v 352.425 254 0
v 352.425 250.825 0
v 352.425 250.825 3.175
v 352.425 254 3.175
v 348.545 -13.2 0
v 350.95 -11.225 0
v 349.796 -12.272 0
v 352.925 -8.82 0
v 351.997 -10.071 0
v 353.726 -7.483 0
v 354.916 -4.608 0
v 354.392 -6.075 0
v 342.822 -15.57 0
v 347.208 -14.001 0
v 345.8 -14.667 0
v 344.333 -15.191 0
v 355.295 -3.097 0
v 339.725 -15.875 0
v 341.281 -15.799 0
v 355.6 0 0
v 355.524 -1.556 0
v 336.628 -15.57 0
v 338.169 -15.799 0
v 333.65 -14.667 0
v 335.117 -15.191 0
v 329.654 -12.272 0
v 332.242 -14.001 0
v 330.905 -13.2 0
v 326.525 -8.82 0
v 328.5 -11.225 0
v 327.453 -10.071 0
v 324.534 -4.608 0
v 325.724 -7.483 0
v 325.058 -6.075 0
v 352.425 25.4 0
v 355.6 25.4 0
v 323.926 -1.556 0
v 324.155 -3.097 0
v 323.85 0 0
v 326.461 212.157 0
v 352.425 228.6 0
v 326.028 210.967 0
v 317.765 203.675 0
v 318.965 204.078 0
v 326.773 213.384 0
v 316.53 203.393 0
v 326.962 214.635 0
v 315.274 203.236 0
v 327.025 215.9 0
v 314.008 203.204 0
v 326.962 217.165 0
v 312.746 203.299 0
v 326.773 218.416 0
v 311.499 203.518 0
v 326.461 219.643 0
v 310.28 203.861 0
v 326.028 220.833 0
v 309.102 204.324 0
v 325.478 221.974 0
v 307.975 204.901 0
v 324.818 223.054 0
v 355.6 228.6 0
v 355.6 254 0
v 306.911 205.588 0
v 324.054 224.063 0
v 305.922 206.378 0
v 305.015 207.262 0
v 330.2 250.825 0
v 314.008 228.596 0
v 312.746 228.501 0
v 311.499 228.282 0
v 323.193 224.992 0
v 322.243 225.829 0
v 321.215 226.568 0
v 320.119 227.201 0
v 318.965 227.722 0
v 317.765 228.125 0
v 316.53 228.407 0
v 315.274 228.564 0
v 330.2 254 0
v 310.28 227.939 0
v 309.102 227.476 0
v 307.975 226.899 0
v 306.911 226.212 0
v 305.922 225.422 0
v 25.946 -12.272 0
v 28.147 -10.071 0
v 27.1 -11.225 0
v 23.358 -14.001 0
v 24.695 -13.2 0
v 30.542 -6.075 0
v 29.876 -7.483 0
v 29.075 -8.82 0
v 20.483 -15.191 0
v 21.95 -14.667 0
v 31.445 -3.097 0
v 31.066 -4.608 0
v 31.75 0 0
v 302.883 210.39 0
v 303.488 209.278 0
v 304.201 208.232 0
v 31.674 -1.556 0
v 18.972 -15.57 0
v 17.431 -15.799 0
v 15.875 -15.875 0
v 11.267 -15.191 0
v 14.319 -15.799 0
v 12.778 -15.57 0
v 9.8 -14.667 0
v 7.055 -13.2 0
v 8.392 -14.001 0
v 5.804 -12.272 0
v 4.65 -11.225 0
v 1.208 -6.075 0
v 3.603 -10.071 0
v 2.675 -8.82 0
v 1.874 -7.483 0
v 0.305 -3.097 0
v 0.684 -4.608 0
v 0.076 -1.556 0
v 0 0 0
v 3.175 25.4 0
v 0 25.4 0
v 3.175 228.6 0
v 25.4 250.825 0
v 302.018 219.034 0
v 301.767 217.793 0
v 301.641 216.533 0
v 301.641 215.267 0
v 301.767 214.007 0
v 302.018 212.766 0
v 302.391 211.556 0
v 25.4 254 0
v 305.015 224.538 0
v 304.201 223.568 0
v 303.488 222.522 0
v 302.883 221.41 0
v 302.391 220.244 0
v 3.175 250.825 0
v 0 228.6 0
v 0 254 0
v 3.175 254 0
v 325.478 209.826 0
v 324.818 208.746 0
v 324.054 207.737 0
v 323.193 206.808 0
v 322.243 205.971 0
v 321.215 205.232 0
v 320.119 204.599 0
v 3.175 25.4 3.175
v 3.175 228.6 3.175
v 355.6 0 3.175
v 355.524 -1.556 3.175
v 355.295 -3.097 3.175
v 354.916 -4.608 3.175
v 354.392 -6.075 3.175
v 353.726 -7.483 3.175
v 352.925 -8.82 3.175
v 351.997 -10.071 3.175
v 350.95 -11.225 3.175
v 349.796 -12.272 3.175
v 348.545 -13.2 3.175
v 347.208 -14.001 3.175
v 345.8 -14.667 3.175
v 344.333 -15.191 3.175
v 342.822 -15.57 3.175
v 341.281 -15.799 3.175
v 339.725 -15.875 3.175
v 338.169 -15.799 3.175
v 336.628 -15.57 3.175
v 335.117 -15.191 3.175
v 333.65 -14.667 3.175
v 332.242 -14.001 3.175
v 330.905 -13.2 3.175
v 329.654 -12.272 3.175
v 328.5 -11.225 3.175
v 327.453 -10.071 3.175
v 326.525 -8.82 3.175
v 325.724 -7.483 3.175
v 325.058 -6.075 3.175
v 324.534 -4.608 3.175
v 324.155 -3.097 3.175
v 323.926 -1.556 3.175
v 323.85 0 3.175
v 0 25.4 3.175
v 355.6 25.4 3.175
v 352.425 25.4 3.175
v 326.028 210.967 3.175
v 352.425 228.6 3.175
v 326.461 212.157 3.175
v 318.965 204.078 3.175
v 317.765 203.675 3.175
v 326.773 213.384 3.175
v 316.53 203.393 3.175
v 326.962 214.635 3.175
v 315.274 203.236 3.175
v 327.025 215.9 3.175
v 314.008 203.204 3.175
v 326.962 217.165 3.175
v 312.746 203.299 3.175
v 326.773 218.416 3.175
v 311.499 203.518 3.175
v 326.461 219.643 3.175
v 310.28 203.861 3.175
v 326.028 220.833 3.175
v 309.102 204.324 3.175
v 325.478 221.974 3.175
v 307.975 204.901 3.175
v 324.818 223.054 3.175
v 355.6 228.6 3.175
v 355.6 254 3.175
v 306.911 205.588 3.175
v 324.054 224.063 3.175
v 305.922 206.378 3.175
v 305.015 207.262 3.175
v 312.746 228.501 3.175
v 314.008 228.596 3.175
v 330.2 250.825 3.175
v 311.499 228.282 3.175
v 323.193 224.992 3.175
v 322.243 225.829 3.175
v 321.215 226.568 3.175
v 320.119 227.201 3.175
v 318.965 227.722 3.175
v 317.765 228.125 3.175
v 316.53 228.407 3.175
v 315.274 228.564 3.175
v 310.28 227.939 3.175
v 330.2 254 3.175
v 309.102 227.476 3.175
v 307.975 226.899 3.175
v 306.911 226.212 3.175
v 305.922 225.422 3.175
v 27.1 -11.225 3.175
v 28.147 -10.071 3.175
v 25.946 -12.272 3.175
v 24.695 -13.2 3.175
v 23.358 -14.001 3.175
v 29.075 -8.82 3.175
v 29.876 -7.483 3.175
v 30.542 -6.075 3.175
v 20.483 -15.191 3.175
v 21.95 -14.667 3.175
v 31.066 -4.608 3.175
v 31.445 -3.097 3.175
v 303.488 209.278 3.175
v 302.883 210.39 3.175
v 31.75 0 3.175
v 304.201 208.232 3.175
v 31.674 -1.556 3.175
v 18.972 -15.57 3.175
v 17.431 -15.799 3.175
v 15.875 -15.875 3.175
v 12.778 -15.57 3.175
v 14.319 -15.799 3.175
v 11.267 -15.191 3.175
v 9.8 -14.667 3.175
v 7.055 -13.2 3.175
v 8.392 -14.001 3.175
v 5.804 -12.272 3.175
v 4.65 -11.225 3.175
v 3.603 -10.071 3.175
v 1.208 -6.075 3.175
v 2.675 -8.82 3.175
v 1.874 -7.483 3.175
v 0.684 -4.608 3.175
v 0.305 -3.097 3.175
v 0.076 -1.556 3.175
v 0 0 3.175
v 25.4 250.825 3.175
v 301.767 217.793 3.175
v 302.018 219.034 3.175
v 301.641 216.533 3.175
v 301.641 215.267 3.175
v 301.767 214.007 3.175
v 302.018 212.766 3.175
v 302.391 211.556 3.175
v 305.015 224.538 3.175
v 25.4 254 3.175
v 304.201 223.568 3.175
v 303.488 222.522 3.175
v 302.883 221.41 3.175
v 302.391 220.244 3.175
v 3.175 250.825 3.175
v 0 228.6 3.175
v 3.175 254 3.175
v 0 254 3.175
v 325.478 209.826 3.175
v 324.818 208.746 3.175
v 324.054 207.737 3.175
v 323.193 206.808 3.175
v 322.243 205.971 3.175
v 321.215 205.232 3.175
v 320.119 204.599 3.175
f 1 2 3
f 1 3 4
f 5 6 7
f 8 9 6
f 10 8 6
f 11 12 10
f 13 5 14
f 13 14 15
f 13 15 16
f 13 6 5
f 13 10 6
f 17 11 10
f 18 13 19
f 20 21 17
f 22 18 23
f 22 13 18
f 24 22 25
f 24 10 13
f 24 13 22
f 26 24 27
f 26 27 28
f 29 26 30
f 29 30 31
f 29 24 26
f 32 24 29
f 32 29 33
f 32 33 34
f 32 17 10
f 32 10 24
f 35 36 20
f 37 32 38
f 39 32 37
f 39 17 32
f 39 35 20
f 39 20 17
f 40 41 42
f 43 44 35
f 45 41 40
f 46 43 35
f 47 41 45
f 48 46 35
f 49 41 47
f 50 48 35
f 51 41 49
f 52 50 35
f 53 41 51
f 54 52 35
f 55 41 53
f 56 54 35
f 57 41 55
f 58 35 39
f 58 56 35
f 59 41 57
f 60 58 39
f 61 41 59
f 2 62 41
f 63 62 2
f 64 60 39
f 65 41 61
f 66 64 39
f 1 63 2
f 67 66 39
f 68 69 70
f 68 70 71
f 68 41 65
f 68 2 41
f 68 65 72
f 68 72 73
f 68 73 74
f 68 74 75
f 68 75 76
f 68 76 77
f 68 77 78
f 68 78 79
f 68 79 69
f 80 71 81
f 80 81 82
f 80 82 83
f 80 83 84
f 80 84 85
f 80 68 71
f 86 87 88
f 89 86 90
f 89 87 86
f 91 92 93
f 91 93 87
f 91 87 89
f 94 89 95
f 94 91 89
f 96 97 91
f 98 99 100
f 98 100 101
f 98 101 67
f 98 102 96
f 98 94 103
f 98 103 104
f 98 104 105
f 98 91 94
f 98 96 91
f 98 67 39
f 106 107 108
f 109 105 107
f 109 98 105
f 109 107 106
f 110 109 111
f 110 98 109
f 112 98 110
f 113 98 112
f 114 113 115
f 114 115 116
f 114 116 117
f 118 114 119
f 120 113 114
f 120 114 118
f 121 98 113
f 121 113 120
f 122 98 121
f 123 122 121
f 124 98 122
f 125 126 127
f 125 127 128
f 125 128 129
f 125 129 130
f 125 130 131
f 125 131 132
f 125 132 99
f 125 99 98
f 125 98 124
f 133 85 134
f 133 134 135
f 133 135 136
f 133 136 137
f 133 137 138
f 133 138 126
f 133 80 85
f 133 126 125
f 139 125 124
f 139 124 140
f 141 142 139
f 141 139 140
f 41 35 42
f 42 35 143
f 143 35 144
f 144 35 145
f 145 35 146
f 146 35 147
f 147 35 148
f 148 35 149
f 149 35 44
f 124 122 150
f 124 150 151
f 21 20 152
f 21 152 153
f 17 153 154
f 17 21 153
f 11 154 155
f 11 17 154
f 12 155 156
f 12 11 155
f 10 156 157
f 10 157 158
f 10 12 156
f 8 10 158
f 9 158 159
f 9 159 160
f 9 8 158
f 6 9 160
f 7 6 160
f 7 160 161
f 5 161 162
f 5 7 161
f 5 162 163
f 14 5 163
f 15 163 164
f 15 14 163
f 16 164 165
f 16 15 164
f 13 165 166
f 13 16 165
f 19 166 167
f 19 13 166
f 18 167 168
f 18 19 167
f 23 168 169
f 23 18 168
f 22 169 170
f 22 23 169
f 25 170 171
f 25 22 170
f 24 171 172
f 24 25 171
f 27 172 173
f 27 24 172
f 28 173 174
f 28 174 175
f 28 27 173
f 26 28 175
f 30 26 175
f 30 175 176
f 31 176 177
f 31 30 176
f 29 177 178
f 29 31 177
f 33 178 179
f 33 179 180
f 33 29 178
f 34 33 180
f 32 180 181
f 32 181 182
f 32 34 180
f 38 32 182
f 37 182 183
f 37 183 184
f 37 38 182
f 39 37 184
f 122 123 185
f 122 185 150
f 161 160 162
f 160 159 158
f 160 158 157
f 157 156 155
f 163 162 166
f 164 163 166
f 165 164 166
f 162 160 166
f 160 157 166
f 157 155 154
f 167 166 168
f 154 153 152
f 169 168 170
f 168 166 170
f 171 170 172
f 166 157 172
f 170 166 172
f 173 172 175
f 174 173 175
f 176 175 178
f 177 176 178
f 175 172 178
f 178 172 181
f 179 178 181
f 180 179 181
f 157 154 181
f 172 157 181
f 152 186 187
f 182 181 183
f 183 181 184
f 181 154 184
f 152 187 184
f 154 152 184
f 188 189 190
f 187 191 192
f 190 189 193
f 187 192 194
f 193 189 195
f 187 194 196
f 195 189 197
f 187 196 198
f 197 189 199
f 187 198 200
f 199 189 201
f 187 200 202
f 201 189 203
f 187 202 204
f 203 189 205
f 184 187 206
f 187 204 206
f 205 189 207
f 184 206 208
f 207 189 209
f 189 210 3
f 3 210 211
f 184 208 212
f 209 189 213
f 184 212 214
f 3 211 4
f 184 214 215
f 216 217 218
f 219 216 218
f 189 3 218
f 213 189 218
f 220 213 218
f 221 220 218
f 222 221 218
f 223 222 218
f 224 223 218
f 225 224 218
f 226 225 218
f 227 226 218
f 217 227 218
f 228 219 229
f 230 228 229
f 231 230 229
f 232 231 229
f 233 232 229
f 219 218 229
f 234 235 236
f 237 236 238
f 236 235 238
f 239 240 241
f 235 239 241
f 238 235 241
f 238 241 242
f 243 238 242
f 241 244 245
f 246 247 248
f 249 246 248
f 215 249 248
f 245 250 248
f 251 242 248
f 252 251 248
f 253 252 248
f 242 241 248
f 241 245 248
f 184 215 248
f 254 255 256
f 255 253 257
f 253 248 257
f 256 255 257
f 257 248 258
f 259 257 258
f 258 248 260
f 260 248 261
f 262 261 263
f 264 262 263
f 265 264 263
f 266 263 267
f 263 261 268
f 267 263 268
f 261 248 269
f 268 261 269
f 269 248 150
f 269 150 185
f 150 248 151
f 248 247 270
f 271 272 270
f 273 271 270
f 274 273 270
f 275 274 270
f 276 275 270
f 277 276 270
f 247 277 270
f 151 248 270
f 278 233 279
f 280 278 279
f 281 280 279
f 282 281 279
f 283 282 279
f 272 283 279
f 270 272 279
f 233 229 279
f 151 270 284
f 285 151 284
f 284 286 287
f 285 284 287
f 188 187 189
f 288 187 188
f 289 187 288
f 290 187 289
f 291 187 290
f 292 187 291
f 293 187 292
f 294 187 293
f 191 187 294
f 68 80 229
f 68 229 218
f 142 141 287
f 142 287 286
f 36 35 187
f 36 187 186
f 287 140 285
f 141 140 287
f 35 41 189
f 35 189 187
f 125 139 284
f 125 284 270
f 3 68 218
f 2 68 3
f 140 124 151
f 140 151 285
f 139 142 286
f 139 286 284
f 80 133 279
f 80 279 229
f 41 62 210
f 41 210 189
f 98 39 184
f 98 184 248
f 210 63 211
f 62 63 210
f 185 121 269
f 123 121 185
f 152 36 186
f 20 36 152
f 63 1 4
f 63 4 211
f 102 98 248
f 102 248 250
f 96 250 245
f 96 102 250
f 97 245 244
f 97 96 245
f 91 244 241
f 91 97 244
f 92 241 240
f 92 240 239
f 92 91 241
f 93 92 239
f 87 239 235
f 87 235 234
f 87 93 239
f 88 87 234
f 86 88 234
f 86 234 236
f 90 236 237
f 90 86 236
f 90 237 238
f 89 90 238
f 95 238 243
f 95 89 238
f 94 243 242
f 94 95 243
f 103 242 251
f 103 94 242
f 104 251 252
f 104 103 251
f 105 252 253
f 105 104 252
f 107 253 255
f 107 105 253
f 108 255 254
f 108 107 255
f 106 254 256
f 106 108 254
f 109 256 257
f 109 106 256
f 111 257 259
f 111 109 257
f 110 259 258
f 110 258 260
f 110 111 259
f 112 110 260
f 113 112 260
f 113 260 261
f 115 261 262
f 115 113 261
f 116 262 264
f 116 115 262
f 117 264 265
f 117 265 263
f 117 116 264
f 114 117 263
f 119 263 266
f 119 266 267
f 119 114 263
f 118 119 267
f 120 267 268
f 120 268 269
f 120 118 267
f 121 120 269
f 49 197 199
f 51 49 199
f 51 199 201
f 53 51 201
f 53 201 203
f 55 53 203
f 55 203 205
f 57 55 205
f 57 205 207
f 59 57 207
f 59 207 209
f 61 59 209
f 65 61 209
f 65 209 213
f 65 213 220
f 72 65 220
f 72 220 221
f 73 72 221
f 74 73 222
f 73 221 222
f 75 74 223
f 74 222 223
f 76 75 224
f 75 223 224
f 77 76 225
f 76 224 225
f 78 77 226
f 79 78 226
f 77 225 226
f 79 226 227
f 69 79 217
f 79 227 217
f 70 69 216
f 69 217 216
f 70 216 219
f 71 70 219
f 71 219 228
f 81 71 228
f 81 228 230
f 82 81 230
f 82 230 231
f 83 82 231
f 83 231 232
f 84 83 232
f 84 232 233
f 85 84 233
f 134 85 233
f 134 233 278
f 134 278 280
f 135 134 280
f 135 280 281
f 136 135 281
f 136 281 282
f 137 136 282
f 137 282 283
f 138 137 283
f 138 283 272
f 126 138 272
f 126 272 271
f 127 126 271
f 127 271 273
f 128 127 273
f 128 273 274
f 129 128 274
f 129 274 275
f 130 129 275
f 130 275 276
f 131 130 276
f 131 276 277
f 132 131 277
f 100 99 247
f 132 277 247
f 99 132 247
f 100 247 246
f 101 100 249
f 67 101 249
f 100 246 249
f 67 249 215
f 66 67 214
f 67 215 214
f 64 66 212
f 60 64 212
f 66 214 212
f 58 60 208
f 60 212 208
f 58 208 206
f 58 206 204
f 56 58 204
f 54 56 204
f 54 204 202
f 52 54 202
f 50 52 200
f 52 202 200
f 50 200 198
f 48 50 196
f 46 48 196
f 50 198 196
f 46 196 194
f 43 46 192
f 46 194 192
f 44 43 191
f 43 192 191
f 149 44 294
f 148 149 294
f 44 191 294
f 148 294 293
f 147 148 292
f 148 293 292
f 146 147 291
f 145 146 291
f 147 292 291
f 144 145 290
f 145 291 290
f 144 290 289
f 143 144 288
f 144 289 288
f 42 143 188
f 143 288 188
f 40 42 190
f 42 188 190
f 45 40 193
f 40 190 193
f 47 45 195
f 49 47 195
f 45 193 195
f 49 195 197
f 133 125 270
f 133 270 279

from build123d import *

# Parameters (mm, degrees)
BOSS_EXTRUDE1_DEPTH = 3.175
SKETCH2_R           = 12.7
CUT_EXTRUDE1_DEPTH  = 4.175


with BuildPart() as part:
    # Sketch1 → Boss-Extrude1 (new body)
    with BuildSketch(Plane.XY):
        with BuildLine():
            Line((0, 228.6), (0, 250.825))
            Line((0, 250.825), (0, 254))
            Line((0, 254), (3.175, 254))
            Line((3.175, 254), (3.175, 250.825))
            Line((3.175, 250.825), (25.4, 250.825))
            Line((25.4, 250.825), (25.4, 254))
            Line((25.4, 254), (330.2, 254))
            Line((330.2, 254), (330.2, 250.825))
            Line((330.2, 250.825), (352.425, 250.825))
            Line((352.425, 250.825), (352.425, 254))
            Line((352.425, 254), (355.6, 254))
            Line((355.6, 254), (355.6, 250.825))
            Line((355.6, 250.825), (355.6, 228.6))
            Line((355.6, 228.6), (352.425, 228.6))
            Line((352.425, 228.6), (352.425, 25.4))
            Line((352.425, 25.4), (355.6, 25.4))
            Line((355.6, 25.4), (355.6, 0))
            ThreePointArc((355.6, 0), (339.725, -15.875), (323.85, 0))
            Line((323.85, 0), (31.75, 0))
            ThreePointArc((31.75, 0), (15.875, -15.875), (0, 0))
            Line((0, 0), (0, 25.4))
            Line((0, 25.4), (3.175, 25.4))
            Line((3.175, 25.4), (3.175, 228.6))
            Line((3.175, 228.6), (0, 228.6))
        make_face()
    extrude(amount=BOSS_EXTRUDE1_DEPTH)

    # Sketch2 → Cut-Extrude1 (cut, through all)
    with BuildSketch(Plane.XY.offset(3.175)):
        with Locations((314.325, 215.9)):
            Circle(SKETCH2_R)
    extrude(amount=-CUT_EXTRUDE1_DEPTH, mode=Mode.SUBTRACT)


solid = part.part
